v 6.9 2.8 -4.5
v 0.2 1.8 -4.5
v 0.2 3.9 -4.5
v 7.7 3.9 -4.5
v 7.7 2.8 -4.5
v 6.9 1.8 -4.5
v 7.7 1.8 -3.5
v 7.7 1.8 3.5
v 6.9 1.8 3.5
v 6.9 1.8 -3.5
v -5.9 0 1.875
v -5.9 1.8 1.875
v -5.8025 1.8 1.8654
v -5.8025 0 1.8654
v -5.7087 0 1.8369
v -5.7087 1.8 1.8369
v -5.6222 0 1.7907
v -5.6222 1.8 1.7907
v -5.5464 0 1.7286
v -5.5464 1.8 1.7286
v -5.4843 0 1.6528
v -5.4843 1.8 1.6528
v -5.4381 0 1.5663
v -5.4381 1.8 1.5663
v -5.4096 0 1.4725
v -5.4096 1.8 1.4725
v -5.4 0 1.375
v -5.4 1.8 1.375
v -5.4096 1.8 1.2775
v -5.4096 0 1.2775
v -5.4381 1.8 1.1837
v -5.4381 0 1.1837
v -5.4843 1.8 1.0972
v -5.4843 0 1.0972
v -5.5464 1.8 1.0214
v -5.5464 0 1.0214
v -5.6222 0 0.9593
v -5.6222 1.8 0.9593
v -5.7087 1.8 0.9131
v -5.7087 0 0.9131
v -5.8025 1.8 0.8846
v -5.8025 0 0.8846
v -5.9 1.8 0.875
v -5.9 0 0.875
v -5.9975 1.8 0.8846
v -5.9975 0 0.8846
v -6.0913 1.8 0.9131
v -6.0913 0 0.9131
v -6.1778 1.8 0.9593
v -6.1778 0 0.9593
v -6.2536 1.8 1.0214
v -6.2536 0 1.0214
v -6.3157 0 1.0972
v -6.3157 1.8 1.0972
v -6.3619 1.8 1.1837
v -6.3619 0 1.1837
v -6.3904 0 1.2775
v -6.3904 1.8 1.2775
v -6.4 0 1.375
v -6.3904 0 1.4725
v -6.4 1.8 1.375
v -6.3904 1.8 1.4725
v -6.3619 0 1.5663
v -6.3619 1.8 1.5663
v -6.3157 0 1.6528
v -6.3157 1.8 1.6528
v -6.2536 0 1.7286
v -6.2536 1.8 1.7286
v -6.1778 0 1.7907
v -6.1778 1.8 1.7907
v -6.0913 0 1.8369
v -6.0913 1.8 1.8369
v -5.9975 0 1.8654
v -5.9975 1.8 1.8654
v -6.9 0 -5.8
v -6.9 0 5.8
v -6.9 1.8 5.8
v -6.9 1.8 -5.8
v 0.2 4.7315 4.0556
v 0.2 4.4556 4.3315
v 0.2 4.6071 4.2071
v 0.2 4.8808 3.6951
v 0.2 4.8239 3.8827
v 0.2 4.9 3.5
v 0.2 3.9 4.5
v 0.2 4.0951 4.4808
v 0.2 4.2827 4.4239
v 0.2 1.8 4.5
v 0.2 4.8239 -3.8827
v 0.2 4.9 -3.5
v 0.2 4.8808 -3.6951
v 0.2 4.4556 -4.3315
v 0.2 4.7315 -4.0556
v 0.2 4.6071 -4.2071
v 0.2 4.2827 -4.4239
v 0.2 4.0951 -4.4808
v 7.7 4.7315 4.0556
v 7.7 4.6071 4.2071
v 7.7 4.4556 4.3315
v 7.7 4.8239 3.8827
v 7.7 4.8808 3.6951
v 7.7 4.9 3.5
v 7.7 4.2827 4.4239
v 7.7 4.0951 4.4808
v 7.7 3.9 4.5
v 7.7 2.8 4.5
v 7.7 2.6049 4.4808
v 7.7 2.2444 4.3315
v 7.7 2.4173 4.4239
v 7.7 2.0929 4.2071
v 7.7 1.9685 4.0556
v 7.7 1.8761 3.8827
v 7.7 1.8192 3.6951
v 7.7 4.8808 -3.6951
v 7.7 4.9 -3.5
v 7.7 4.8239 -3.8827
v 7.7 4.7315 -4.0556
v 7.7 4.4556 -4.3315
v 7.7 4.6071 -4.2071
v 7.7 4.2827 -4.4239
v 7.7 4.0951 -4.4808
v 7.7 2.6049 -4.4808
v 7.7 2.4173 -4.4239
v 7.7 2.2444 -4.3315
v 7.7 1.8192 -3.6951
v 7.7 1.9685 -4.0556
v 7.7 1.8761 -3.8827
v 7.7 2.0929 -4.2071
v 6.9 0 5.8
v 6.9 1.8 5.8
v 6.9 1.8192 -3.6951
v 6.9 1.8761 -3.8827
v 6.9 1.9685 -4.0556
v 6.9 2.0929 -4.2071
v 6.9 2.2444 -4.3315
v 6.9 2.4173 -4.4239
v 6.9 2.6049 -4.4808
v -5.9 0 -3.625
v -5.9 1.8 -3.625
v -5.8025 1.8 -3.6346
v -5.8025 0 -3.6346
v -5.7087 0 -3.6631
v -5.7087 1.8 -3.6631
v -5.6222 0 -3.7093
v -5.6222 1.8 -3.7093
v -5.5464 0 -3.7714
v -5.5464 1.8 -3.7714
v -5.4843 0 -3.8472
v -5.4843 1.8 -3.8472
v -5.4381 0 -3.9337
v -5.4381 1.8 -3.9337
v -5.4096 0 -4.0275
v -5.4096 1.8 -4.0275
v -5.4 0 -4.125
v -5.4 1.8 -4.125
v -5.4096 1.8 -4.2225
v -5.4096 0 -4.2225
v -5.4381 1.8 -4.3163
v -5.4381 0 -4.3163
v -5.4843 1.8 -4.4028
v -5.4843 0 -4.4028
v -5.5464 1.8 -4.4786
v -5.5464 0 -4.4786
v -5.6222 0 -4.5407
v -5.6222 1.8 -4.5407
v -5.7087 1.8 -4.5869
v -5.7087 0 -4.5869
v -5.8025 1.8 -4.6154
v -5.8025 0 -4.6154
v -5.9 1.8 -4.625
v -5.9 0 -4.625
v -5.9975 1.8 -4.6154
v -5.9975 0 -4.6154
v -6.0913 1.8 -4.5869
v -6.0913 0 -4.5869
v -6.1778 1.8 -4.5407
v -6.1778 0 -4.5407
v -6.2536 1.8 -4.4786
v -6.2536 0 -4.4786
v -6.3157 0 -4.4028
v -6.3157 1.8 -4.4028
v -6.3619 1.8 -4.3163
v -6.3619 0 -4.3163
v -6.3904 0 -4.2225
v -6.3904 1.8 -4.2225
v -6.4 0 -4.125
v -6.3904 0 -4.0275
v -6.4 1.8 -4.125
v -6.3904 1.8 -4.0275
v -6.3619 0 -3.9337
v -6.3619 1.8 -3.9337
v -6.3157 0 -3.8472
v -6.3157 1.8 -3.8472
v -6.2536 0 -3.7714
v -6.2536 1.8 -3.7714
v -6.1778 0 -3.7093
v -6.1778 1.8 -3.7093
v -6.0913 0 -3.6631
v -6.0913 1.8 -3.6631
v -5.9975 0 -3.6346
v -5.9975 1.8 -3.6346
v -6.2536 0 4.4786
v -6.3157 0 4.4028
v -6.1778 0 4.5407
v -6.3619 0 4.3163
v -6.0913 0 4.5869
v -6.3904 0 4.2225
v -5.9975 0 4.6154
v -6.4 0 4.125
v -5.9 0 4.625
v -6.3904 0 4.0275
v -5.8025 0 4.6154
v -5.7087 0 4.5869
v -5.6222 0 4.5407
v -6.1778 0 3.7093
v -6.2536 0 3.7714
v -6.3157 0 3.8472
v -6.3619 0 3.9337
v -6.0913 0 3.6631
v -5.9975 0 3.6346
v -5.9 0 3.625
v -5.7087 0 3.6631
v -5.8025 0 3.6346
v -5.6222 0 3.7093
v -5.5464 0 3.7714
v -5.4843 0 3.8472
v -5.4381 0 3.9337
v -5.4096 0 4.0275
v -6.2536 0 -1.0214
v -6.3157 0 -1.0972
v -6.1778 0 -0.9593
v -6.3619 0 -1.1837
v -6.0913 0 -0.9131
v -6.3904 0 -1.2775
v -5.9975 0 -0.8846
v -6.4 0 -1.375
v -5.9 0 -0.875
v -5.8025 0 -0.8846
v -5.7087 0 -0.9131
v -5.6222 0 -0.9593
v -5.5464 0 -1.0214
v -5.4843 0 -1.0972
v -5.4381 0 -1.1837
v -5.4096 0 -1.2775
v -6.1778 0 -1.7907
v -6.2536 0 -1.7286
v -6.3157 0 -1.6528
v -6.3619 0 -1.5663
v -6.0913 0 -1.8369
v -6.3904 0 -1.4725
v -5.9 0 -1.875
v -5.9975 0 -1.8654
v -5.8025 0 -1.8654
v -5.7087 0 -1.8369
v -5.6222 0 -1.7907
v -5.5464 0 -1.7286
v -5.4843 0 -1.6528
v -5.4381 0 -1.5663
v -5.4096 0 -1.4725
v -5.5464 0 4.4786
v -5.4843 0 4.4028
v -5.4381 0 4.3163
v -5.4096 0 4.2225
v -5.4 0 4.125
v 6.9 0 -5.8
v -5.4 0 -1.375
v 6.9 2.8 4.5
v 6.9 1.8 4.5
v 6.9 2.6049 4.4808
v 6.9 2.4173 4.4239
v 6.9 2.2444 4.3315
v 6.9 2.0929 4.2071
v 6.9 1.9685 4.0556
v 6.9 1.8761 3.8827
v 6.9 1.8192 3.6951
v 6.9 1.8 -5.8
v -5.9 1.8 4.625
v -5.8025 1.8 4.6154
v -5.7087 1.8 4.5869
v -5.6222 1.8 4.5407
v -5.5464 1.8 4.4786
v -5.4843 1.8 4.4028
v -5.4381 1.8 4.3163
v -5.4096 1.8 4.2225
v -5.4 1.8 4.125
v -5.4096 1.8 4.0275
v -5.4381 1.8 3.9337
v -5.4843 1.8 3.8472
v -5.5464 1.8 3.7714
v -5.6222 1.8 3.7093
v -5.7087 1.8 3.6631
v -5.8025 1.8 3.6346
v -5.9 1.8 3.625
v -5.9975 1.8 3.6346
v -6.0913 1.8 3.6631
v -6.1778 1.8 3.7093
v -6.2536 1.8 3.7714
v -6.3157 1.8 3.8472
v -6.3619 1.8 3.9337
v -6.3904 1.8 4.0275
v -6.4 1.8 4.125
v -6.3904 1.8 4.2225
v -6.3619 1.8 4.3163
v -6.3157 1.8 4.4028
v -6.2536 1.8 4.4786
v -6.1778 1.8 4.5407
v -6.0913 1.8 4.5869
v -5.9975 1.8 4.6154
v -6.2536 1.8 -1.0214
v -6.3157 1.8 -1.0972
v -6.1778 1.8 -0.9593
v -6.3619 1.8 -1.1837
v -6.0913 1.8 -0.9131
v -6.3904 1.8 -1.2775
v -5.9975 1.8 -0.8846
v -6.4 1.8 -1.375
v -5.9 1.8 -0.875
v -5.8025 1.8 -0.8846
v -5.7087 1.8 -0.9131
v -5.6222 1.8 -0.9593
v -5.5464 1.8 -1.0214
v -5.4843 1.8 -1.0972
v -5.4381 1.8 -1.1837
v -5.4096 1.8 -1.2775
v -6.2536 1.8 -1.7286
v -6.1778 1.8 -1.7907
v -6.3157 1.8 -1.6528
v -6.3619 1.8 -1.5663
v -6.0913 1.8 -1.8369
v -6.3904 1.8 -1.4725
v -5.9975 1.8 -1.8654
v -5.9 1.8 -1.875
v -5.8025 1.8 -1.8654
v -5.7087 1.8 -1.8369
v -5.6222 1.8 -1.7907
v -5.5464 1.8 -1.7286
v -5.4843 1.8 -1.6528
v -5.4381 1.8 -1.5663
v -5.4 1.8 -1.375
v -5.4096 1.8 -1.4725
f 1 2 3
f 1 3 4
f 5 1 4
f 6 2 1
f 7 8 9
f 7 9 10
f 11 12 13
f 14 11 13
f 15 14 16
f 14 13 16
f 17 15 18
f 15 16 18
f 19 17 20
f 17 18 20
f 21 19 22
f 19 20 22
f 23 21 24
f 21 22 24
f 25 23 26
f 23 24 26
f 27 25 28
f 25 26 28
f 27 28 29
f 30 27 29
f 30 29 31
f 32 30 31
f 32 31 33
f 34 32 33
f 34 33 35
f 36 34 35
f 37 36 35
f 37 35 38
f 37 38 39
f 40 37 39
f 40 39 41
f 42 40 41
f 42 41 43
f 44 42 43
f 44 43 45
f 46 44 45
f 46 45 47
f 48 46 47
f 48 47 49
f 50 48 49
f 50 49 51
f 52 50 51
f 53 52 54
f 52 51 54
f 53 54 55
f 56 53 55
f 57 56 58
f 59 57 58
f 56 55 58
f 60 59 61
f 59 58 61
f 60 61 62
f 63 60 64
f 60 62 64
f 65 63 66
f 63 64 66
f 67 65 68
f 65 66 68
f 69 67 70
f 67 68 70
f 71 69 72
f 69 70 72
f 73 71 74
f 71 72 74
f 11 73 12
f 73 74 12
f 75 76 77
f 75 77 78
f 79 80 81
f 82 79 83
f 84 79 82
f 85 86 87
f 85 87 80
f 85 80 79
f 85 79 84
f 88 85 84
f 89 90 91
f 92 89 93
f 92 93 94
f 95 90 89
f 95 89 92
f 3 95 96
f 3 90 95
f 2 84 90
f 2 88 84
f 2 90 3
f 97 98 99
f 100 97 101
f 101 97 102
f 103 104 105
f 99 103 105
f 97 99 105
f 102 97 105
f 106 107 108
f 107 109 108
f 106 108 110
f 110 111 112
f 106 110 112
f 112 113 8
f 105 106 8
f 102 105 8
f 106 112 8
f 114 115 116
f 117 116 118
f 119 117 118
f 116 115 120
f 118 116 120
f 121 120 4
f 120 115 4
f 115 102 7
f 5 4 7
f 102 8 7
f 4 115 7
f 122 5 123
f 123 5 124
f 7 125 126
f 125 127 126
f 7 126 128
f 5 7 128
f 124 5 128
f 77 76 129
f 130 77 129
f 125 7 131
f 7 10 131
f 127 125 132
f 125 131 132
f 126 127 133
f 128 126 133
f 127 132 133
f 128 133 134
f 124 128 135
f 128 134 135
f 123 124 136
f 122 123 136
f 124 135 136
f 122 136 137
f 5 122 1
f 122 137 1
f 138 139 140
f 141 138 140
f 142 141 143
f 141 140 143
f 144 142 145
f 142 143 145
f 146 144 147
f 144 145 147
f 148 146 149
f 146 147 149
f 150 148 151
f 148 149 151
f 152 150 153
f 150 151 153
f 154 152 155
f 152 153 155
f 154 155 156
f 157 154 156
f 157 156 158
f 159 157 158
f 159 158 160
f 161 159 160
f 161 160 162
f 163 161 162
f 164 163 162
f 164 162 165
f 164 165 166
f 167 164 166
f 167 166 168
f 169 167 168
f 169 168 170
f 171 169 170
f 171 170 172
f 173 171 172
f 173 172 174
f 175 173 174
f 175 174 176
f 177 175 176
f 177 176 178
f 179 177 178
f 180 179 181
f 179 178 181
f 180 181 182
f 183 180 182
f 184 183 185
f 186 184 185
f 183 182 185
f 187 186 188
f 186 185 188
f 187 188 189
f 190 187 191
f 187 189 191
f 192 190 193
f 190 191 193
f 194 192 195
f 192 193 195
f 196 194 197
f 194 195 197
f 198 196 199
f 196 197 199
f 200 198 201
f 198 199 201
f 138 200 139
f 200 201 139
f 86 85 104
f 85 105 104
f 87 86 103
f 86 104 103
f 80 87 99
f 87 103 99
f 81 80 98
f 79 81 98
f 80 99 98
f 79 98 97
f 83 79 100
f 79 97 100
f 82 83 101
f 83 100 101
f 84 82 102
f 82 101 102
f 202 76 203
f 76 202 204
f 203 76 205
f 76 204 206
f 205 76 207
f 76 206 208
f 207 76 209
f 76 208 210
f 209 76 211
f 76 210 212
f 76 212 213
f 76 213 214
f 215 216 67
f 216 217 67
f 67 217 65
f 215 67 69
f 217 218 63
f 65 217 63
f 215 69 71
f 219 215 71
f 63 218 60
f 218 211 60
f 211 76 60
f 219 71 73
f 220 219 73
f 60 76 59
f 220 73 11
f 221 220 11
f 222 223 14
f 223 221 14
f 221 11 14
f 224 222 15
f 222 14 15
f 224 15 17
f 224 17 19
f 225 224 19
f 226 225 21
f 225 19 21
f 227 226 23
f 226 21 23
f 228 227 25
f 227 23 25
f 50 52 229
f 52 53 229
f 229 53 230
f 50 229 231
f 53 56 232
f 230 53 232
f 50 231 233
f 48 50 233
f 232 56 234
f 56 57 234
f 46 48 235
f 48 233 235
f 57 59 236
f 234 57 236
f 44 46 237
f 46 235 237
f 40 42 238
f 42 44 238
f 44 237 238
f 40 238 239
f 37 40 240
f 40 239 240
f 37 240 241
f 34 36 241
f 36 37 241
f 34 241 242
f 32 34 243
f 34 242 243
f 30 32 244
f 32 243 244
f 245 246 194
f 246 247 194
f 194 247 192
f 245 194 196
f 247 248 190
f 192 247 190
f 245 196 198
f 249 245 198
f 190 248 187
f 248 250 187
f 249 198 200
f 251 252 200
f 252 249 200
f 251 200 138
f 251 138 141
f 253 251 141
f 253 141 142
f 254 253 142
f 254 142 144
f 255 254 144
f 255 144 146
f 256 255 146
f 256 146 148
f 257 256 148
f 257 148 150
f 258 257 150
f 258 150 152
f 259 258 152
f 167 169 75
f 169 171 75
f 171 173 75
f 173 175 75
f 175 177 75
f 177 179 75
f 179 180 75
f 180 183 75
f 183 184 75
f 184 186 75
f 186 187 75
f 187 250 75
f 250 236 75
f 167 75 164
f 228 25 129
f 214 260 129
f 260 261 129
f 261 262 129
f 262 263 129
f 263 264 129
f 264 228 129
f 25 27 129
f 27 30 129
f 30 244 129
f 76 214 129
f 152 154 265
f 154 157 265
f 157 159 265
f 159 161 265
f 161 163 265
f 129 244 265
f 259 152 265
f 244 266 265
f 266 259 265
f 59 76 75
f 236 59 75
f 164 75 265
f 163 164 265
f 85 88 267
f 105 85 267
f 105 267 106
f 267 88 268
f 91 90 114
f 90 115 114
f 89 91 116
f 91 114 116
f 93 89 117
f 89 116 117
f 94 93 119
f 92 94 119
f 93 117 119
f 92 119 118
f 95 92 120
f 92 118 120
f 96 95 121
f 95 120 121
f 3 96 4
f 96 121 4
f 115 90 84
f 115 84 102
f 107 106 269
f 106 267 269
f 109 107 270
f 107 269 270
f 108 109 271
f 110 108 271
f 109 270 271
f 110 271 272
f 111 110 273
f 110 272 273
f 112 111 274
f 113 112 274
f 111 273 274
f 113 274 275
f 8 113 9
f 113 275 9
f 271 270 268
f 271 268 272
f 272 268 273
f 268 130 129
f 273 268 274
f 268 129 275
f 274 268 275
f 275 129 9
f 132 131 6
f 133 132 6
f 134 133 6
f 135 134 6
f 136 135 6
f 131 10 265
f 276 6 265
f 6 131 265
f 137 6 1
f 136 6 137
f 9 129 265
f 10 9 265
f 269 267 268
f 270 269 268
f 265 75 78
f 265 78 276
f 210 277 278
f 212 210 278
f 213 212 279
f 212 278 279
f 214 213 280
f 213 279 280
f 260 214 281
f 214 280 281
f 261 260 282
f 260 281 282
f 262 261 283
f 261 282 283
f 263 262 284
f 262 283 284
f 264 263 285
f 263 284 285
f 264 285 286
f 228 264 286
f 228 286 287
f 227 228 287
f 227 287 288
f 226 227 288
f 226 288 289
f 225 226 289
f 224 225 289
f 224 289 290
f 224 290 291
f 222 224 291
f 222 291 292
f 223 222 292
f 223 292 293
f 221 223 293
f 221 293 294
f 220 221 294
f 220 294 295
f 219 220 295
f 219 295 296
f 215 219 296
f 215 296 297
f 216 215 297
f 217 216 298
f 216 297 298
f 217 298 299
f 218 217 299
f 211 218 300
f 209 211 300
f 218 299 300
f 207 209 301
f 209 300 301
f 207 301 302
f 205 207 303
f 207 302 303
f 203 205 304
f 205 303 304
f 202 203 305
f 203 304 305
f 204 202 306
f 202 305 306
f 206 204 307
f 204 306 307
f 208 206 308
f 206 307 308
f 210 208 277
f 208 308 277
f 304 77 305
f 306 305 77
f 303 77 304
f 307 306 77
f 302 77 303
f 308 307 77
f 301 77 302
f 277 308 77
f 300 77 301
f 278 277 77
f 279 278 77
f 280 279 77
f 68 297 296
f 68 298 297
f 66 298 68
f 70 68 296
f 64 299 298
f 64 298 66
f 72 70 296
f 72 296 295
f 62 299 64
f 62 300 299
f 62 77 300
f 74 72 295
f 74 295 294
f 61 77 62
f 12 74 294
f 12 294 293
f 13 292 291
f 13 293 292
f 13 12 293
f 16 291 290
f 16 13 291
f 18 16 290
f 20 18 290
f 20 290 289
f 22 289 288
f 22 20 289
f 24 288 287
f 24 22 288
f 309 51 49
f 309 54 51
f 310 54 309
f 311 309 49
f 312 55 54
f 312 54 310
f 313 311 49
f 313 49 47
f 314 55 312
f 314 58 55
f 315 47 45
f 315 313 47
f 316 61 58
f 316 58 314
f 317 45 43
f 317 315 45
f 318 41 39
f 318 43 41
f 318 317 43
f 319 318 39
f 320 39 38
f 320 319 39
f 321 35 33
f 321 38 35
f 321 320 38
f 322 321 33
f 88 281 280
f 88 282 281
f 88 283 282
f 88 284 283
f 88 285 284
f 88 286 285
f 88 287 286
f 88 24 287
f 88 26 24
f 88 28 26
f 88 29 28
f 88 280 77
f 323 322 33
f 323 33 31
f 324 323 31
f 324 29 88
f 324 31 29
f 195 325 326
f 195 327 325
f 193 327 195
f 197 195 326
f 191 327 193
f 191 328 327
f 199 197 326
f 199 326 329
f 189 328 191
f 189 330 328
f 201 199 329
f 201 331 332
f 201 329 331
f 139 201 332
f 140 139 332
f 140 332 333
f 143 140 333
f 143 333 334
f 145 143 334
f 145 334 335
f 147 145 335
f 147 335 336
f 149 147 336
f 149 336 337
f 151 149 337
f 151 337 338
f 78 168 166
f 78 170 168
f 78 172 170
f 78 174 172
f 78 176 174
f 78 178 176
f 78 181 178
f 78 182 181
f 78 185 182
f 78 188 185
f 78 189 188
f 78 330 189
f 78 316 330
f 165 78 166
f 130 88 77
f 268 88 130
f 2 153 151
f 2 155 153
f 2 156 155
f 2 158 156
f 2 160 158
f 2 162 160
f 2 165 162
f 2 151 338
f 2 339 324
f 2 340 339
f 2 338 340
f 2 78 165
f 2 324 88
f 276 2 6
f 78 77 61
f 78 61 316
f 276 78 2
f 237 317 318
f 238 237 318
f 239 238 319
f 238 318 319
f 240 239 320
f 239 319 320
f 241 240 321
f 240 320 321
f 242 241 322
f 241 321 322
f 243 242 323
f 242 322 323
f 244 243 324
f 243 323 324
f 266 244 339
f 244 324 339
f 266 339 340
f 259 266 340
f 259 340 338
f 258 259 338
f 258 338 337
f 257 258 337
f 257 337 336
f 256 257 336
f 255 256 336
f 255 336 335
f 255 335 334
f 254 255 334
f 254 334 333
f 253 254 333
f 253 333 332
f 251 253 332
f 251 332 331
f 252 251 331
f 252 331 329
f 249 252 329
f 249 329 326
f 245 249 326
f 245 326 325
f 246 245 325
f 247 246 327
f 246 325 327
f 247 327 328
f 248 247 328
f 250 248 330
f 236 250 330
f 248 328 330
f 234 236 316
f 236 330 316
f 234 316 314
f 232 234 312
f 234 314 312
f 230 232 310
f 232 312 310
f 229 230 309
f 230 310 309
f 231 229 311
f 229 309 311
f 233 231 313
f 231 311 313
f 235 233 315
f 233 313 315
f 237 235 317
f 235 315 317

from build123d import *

# Parameters (mm, degrees)
SKETCH_1_W          = 13.8
SKETCH_1_H          = 11.6
EXTRUDE_1_DEPTH     = 1.8
EXTRUDE_START       = -1.8
SKETCH_4_W          = 7.5
SKETCH_4_H          = 9
EXTRUDE_2_DEPTH     = 4.9
SKETCH_5_W          = 9
SKETCH_5_H          = 1.8
CUT_EXTRUDE_1_DEPTH = 0.8
FILLET_1_R          = 1
CUT_EXTRUDE_2_REACH = 12.126
SKETCH_6_R          = 0.5


with BuildPart() as part:
    # 草图1 → 凸台-拉伸1 (new body)
    with BuildSketch(Plane(origin=(0, 0, 0), x_dir=(1, 0, 0), z_dir=(0, 1, 0))):
        Rectangle(SKETCH_1_W, SKETCH_1_H)
    extrude(amount=EXTRUDE_1_DEPTH)

    # 草图4 → 凸台-拉伸2 (add)
    with BuildSketch(Plane(origin=(0, 1.8, 0), x_dir=(1, 0, 0), z_dir=(0, 1, 0)).offset(EXTRUDE_START)):
        with Locations((3.95, 0)):
            Rectangle(SKETCH_4_W, SKETCH_4_H)
    extrude(amount=EXTRUDE_2_DEPTH)

    # 草图5 → 切除-拉伸1 (cut)
    with BuildSketch(Plane(origin=(7.7, 0, 0), x_dir=(0, 0, -1), z_dir=(1, 0, 0))):
        with Locations((0, 0.9)):
            Rectangle(SKETCH_5_W, SKETCH_5_H)
    extrude(amount=-CUT_EXTRUDE_1_DEPTH, mode=Mode.SUBTRACT)

    # 圆角1
    fillet_1_edges = [part.edges().sort_by_distance(p)[0] for p in [
        (3.95, 4.9, 4.5),
        (3.95, 4.9, -4.5),
        (7.3, 1.8, -4.5),
        (7.3, 1.8, 4.5),
    ]]
    fillet(fillet_1_edges, radius=FILLET_1_R)

    # 草图6 → 切除-拉伸2 (cut, up to next)
    with BuildSketch(Plane(origin=(0, 1.8, 0), x_dir=(1, 0, 0), z_dir=(0, 1, 0)), mode=Mode.PRIVATE) as cut_extrude_2_sk1:
        with Locations(Location((-5.9, 4.125, 0), (0, 0, 270))):
            Circle(SKETCH_6_R)
    cut_extrude_2_tool1 = extrude(cut_extrude_2_sk1.sketch, amount=-CUT_EXTRUDE_2_REACH, mode=Mode.PRIVATE) & part.part
    # 草图6 → 切除-拉伸2 (cut, up to next)
    with BuildSketch(Plane(origin=(0, 1.8, 0), x_dir=(1, 0, 0), z_dir=(0, 1, 0)), mode=Mode.PRIVATE) as cut_extrude_2_sk2:
        with Locations(Location((-5.9, 1.375, 0), (0, 0, 270))):
            Circle(SKETCH_6_R)
    cut_extrude_2_tool2 = extrude(cut_extrude_2_sk2.sketch, amount=-CUT_EXTRUDE_2_REACH, mode=Mode.PRIVATE) & part.part
    # 草图6 → 切除-拉伸2 (cut, up to next)
    with BuildSketch(Plane(origin=(0, 1.8, 0), x_dir=(1, 0, 0), z_dir=(0, 1, 0)), mode=Mode.PRIVATE) as cut_extrude_2_sk3:
        with Locations(Location((-5.9, -1.375, 0), (0, 0, 270))):
            Circle(SKETCH_6_R)
    cut_extrude_2_tool3 = extrude(cut_extrude_2_sk3.sketch, amount=-CUT_EXTRUDE_2_REACH, mode=Mode.PRIVATE) & part.part
    # 草图6 → 切除-拉伸2 (cut, up to next)
    with BuildSketch(Plane(origin=(0, 1.8, 0), x_dir=(1, 0, 0), z_dir=(0, 1, 0)), mode=Mode.PRIVATE) as cut_extrude_2_sk4:
        with Locations(Location((-5.9, -4.125, 0), (0, 0, 270))):
            Circle(SKETCH_6_R)
    cut_extrude_2_tool4 = extrude(cut_extrude_2_sk4.sketch, amount=-CUT_EXTRUDE_2_REACH, mode=Mode.PRIVATE) & part.part
    add(cut_extrude_2_tool1.solids().sort_by_distance((-5.9, 1.8, -4.125))[0], mode=Mode.SUBTRACT)
    add(cut_extrude_2_tool2.solids().sort_by_distance((-5.9, 1.8, -1.375))[0], mode=Mode.SUBTRACT)
    add(cut_extrude_2_tool3.solids().sort_by_distance((-5.9, 1.8, 1.375))[0], mode=Mode.SUBTRACT)
    add(cut_extrude_2_tool4.solids().sort_by_distance((-5.9, 1.8, 4.125))[0], mode=Mode.SUBTRACT)


solid = part.part
